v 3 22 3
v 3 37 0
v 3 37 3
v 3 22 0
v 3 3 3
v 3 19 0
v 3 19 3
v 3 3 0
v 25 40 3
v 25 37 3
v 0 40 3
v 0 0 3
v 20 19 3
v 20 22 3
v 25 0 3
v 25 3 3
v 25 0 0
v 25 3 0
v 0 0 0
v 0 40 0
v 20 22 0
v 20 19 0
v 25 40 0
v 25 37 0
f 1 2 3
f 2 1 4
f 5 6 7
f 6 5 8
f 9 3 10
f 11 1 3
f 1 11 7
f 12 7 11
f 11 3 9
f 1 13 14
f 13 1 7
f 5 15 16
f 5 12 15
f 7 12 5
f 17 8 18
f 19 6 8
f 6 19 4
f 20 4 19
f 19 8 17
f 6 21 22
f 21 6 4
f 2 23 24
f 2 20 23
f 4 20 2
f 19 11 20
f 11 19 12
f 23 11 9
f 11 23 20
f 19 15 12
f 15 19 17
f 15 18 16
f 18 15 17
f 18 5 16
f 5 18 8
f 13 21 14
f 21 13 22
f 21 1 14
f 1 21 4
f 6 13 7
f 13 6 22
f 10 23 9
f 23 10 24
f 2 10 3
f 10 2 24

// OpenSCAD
union(){ 
 cube([3,40,3]);
 cube([25,3,3]);
 translate([0,19,0]) cube([20,3,3]);
 translate([0,37,0]) cube([25,3,3]);
}
